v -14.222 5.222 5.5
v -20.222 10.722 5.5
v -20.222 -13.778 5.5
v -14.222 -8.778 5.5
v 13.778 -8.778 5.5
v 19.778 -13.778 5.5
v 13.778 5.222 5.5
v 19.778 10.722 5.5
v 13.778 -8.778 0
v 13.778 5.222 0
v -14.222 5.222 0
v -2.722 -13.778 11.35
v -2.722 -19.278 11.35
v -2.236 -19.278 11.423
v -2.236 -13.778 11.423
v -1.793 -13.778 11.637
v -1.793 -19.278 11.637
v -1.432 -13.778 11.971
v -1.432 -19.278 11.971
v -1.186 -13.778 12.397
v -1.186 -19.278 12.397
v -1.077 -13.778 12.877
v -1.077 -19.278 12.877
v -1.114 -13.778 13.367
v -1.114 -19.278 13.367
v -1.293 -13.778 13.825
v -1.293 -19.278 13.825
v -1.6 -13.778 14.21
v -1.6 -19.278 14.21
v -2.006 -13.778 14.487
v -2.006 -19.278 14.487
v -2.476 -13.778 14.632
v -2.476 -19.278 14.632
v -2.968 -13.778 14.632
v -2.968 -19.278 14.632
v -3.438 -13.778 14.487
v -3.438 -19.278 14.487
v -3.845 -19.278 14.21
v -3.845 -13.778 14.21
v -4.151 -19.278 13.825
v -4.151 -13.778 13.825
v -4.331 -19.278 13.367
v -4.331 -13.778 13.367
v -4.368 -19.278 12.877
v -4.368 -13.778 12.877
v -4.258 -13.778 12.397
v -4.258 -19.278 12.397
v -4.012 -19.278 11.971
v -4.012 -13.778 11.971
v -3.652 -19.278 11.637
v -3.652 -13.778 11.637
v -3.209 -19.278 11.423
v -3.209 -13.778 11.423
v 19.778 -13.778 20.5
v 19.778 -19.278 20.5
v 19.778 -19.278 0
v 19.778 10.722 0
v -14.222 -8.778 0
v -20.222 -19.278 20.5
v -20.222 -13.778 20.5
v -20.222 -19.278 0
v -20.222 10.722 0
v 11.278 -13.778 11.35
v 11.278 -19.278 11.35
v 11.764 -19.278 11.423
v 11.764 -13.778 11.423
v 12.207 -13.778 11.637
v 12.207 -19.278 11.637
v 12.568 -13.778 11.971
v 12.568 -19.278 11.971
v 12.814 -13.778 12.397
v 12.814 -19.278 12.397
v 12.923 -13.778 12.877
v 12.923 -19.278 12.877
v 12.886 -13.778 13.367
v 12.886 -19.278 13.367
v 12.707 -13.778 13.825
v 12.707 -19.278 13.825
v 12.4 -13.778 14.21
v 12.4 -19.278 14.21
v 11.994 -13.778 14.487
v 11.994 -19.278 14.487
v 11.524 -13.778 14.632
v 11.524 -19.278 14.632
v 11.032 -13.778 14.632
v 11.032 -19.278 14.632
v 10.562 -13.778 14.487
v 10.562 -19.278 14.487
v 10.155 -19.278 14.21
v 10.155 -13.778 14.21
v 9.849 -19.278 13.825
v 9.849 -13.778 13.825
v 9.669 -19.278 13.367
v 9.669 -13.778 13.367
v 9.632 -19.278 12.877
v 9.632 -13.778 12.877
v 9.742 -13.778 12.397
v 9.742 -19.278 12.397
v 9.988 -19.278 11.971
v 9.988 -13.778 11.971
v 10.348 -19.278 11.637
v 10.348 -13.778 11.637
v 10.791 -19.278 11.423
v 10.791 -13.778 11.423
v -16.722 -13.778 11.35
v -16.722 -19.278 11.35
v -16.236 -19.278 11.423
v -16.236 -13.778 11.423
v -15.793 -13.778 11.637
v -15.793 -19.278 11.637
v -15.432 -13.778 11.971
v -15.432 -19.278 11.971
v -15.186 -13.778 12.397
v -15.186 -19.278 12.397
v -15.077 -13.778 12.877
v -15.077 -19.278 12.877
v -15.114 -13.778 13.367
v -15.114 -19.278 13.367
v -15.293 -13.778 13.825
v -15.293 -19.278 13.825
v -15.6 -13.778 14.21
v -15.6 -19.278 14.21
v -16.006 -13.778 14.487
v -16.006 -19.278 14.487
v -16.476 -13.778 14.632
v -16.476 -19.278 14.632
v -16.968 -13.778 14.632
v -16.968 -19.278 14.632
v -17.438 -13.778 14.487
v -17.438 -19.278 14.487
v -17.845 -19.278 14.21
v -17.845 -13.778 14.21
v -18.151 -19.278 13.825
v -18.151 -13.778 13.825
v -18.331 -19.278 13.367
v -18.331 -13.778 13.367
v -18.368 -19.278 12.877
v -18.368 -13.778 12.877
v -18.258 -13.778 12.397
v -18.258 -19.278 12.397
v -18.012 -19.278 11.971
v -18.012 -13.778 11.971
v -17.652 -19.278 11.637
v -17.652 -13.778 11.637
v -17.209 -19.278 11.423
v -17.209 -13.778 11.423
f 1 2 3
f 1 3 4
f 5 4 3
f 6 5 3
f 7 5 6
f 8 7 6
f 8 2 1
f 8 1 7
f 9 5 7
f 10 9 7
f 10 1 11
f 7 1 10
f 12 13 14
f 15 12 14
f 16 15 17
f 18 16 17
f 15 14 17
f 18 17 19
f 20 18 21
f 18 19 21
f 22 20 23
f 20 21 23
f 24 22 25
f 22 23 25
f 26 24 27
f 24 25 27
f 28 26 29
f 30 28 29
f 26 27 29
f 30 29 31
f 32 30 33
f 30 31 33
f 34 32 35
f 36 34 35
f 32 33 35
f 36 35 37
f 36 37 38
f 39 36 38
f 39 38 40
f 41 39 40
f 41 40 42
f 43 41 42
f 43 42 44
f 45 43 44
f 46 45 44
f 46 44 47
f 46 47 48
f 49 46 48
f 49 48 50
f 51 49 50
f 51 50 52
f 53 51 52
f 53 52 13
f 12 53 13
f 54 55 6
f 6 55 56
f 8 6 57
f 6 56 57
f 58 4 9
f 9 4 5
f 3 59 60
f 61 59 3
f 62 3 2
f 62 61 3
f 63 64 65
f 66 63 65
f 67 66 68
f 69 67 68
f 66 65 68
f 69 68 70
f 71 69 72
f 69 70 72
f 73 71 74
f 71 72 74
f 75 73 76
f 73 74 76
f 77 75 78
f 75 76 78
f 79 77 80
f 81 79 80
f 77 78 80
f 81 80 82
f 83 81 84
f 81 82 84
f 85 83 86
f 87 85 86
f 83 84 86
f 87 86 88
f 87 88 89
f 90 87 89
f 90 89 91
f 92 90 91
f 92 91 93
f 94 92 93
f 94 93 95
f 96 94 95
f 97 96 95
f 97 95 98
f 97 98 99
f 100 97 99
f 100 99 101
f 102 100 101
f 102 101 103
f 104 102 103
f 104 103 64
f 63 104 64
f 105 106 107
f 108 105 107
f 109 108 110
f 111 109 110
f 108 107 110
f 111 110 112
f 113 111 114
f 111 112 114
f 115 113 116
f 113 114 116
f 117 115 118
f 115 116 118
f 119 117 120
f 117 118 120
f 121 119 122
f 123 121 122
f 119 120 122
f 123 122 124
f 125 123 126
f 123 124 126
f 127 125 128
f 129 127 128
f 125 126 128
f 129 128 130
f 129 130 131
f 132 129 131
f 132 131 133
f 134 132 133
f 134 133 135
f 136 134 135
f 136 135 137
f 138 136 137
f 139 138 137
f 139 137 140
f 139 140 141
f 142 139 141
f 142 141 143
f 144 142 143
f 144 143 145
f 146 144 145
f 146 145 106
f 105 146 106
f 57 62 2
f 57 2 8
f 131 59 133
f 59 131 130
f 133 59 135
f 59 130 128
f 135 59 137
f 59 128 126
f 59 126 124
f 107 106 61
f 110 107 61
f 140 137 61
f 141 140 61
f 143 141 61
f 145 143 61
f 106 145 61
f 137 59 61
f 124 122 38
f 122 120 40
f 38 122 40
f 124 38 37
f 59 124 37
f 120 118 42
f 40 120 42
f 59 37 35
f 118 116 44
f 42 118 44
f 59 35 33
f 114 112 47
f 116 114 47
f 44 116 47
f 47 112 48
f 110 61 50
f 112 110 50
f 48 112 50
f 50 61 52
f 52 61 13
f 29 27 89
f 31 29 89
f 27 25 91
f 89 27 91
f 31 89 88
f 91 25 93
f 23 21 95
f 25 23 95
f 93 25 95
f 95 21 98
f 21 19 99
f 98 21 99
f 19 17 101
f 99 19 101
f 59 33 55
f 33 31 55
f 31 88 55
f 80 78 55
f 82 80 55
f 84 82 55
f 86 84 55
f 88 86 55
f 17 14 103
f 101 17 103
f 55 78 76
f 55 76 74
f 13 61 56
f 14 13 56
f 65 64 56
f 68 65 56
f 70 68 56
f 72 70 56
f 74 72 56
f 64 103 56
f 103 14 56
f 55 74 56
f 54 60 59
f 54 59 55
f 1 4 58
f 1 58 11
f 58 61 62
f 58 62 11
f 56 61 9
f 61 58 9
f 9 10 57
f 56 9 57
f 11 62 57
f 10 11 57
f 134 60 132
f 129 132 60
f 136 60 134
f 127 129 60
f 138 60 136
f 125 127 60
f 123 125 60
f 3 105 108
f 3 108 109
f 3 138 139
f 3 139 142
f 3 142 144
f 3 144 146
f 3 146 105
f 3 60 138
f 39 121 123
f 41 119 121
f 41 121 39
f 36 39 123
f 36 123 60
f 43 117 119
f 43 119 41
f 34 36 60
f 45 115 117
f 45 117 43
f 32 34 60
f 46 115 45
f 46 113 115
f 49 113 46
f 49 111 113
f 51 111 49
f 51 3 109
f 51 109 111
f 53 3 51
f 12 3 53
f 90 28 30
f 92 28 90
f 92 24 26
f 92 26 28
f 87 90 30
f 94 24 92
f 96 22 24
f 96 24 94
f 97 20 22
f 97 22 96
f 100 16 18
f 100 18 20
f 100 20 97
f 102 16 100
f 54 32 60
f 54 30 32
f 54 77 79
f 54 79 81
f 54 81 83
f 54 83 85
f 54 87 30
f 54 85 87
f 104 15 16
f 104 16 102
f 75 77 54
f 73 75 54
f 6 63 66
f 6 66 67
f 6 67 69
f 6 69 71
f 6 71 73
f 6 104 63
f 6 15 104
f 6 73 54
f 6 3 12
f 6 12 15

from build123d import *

# Parameters (mm, degrees)
SKETCH1_W           = 40
SKETCH1_H           = 30
BOSS_EXTRUDE1_DEPTH = 5.5
SKETCH4_W           = 28
SKETCH4_H           = 14
CUT_EXTRUDE1_DEPTH  = 5.5
SKETCH5_W           = 40
SKETCH5_H           = 5.5
BOSS_EXTRUDE2_DEPTH = 15
SKETCH6_R           = 1.65
CUT_EXTRUDE3_DEPTH  = 15


with BuildPart() as part:
    # Sketch1 → Boss-Extrude1 (new body)
    with BuildSketch(Plane.XY):
        with Locations((-0.222222222, -4.277777778)):
            Rectangle(SKETCH1_W, SKETCH1_H)
    extrude(amount=BOSS_EXTRUDE1_DEPTH)

    # Sketch4 → Cut-Extrude1 (cut)
    with BuildSketch(Plane.XY.offset(5.5)):
        with Locations((-0.222222222, -1.777777778)):
            Rectangle(SKETCH4_W, SKETCH4_H)
    extrude(amount=-CUT_EXTRUDE1_DEPTH, mode=Mode.SUBTRACT)

    # Sketch5 → Boss-Extrude2 (add)
    with BuildSketch(Plane.XY.offset(5.5)):
        with Locations((-0.222222222, -16.527777778)):
            Rectangle(SKETCH5_W, SKETCH5_H)
    extrude(amount=BOSS_EXTRUDE2_DEPTH)

    # Sketch6 → Cut-Extrude3 (cut)
    with BuildSketch(Plane.XZ.offset(19.277777778)):
        with Locations(Location((-16.722222222, 13, 0), (0, 0, 270))):
            Circle(SKETCH6_R)
        with Locations(Location((-2.722222222, 13, 0), (0, 0, 270))):
            Circle(SKETCH6_R)
        with Locations(Location((11.277777778, 13, 0), (0, 0, 270))):
            Circle(SKETCH6_R)
    extrude(amount=-CUT_EXTRUDE3_DEPTH, mode=Mode.SUBTRACT)


solid = part.part
